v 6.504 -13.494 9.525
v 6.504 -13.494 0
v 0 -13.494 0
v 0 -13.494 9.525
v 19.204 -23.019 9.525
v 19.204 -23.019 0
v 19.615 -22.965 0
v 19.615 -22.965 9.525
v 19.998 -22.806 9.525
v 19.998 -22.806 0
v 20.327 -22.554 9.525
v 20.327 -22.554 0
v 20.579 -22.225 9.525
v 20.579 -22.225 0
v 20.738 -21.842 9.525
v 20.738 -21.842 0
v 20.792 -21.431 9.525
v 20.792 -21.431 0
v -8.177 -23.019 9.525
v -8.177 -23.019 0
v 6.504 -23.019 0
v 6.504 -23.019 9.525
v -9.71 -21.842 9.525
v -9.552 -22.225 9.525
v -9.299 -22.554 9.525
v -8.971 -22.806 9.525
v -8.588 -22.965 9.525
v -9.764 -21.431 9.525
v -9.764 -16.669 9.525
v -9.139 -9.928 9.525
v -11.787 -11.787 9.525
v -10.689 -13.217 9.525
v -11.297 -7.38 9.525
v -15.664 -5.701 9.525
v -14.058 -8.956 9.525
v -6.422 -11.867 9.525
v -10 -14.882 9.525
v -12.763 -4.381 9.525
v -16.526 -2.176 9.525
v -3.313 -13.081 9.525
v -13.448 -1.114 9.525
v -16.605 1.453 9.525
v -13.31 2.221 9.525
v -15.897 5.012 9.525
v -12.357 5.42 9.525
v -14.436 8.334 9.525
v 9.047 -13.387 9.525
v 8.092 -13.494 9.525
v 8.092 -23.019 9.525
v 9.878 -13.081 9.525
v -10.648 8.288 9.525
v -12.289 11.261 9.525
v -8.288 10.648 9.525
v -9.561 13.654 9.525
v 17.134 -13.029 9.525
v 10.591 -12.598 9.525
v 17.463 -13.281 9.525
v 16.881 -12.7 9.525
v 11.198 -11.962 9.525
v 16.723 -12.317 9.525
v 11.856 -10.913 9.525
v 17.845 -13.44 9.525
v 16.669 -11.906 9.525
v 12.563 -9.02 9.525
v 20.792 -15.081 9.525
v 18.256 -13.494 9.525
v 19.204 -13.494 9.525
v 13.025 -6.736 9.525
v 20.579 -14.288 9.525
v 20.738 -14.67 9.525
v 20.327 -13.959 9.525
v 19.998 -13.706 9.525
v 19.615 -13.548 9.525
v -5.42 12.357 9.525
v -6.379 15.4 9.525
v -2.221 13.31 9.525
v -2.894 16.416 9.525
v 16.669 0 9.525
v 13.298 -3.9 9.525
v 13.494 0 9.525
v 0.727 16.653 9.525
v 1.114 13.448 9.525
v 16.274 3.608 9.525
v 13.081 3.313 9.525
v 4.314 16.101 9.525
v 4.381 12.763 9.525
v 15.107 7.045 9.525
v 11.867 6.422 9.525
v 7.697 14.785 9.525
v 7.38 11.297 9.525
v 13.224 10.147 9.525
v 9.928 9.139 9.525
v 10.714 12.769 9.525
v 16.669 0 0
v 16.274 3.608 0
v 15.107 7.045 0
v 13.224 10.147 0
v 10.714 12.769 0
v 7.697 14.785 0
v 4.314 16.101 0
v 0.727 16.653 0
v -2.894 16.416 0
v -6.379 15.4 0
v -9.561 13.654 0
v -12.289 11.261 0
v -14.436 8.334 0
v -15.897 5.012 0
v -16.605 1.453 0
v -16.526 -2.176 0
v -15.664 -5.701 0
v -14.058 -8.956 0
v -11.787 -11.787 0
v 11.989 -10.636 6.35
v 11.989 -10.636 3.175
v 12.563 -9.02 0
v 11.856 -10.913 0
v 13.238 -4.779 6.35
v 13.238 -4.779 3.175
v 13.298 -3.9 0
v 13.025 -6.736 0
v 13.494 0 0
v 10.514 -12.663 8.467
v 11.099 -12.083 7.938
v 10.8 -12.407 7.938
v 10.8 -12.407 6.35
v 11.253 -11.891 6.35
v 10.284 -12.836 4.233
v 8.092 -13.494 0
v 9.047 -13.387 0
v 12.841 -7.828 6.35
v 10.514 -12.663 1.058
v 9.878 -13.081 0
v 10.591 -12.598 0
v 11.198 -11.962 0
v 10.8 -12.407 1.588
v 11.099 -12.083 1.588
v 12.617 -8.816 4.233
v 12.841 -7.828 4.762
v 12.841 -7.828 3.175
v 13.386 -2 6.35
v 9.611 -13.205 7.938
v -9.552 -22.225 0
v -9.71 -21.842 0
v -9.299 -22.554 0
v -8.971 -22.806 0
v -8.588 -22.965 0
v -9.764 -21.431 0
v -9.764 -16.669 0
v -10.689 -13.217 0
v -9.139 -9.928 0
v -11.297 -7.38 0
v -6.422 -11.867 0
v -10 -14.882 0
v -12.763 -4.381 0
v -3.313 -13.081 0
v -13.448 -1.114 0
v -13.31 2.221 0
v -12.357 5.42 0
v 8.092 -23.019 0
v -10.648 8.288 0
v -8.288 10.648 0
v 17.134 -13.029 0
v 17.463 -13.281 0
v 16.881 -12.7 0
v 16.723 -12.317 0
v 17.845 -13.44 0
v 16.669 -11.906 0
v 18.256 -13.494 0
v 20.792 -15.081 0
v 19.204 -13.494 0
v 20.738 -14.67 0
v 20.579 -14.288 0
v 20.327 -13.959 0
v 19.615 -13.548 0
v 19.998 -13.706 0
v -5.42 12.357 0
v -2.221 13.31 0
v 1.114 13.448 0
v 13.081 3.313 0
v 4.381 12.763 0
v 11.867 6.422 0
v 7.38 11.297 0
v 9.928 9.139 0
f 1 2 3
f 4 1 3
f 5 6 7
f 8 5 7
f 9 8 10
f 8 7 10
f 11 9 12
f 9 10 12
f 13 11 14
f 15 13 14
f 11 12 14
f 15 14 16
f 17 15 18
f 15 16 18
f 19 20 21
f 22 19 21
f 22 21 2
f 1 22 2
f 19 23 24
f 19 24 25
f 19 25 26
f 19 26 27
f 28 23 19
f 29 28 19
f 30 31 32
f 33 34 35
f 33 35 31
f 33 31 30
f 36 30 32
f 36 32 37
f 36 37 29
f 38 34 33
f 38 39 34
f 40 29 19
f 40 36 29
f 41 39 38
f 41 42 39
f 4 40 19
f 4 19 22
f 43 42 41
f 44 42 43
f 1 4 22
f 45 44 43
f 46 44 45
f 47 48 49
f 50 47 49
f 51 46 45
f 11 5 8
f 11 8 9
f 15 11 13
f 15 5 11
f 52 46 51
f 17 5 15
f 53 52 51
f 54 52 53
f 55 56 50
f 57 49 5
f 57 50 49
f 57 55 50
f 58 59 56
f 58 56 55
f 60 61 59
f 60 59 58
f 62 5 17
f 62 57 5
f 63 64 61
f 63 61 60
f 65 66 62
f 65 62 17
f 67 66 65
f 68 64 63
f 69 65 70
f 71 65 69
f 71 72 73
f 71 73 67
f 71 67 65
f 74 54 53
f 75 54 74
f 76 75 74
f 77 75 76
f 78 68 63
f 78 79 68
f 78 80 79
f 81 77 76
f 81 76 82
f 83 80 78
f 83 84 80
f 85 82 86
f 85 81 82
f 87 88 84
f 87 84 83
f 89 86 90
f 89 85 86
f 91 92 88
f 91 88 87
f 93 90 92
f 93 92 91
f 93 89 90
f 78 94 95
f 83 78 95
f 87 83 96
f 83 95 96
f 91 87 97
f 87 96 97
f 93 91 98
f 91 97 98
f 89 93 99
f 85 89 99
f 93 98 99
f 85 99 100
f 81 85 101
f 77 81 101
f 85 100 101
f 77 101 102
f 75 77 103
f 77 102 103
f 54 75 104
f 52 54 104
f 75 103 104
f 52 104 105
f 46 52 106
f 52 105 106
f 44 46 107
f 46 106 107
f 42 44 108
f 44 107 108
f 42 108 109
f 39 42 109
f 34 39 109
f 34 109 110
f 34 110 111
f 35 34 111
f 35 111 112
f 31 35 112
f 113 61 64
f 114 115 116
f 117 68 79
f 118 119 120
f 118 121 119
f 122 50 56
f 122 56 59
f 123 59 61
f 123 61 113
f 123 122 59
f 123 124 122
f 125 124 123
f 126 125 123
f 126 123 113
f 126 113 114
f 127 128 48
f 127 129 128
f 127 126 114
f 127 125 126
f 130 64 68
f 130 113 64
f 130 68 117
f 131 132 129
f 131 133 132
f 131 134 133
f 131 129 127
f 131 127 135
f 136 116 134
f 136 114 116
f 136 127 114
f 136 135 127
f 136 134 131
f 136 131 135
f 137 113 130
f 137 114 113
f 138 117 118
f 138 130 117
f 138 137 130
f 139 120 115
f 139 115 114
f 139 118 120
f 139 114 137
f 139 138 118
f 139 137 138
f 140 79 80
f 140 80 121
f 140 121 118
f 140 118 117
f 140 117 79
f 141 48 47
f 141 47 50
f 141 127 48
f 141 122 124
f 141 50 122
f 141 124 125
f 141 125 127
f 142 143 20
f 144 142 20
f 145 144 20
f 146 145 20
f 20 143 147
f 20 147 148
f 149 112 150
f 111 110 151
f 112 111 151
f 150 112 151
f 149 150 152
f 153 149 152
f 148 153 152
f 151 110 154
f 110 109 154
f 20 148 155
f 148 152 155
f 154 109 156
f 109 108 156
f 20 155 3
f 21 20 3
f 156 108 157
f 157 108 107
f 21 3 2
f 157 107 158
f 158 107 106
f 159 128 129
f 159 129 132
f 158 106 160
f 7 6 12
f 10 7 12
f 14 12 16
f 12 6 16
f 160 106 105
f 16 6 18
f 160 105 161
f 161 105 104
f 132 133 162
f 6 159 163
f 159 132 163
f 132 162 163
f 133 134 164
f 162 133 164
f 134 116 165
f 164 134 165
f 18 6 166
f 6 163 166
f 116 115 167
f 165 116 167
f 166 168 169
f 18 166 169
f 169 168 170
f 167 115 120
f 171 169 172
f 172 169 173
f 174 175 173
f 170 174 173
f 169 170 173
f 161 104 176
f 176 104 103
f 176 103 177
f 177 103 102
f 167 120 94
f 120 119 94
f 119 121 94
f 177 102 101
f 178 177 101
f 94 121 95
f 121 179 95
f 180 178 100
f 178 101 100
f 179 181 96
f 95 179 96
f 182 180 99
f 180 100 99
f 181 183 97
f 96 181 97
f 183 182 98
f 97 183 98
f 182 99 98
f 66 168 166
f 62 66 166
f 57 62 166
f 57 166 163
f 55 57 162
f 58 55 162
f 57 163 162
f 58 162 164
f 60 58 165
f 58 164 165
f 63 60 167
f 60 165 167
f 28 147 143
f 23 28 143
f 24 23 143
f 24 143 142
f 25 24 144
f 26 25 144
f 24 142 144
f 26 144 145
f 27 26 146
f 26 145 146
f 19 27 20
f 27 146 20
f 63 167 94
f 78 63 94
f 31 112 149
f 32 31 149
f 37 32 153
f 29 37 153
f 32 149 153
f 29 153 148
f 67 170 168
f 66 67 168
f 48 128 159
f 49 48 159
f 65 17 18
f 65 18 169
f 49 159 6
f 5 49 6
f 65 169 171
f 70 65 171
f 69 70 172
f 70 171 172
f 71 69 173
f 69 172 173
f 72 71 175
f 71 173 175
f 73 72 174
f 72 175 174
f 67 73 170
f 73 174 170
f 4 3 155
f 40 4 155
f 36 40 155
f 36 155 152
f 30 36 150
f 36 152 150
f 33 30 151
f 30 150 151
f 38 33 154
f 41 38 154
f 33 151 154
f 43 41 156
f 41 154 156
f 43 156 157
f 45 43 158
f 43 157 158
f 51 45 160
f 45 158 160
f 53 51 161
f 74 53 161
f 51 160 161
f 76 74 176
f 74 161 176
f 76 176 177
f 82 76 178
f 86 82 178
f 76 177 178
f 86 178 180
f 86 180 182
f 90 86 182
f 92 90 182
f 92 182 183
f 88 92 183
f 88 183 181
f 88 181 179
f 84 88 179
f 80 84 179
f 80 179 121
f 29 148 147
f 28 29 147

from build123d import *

# Parameters (mm, degrees)
F1_DEPTH = 9.525


with BuildPart() as f1:
    # F0 (on Top) → F1 (new body)
    with BuildSketch(Plane.XY):
        with BuildLine():
            ThreePointArc((0, -13.49375), (-9.541522, 9.541522), (13.49375, 0))
            add(Edge.make_bspline(
                [(8.091652, -13.49375), (13.864147, -13.49375), (13.182361, -2.882126), (13.49375, 0)],
                knots=[0, 0, 0, 0, 14.534922, 14.534922, 14.534922, 14.534922], degree=3))
            Line((8.091652, -13.49375), (8.091652, -23.01875))
            Line((8.091652, -23.01875), (19.204152, -23.01875))
            ThreePointArc((19.204152, -23.01875), (20.326684, -22.553782), (20.791652, -21.43125))
            Line((20.791652, -21.43125), (20.791652, -15.08125))
            ThreePointArc((20.791652, -15.08125), (20.326684, -13.958718), (19.204152, -13.49375))
            Line((19.204152, -13.49375), (18.25625, -13.49375))
            ThreePointArc((18.25625, -13.49375), (17.133718, -13.028782), (16.66875, -11.90625))
            Line((16.66875, -11.90625), (16.66875, 0))
            ThreePointArc((16.66875, 0), (-6.378854, 15.399917), (-11.786586, -11.786586))
            ThreePointArc((-11.786586, -11.786586), (-10.289896, -14.026542), (-9.764328, -16.66875))
            Line((-9.764328, -16.66875), (-9.764328, -21.43125))
            ThreePointArc((-9.764328, -21.43125), (-9.29936, -22.553782), (-8.176828, -23.01875))
            Line((-8.176828, -23.01875), (6.504152, -23.01875))
            Line((6.504152, -23.01875), (6.504152, -13.49375))
            Line((6.504152, -13.49375), (0, -13.49375))
        make_face()
    extrude(amount=F1_DEPTH)


solid = f1.part
